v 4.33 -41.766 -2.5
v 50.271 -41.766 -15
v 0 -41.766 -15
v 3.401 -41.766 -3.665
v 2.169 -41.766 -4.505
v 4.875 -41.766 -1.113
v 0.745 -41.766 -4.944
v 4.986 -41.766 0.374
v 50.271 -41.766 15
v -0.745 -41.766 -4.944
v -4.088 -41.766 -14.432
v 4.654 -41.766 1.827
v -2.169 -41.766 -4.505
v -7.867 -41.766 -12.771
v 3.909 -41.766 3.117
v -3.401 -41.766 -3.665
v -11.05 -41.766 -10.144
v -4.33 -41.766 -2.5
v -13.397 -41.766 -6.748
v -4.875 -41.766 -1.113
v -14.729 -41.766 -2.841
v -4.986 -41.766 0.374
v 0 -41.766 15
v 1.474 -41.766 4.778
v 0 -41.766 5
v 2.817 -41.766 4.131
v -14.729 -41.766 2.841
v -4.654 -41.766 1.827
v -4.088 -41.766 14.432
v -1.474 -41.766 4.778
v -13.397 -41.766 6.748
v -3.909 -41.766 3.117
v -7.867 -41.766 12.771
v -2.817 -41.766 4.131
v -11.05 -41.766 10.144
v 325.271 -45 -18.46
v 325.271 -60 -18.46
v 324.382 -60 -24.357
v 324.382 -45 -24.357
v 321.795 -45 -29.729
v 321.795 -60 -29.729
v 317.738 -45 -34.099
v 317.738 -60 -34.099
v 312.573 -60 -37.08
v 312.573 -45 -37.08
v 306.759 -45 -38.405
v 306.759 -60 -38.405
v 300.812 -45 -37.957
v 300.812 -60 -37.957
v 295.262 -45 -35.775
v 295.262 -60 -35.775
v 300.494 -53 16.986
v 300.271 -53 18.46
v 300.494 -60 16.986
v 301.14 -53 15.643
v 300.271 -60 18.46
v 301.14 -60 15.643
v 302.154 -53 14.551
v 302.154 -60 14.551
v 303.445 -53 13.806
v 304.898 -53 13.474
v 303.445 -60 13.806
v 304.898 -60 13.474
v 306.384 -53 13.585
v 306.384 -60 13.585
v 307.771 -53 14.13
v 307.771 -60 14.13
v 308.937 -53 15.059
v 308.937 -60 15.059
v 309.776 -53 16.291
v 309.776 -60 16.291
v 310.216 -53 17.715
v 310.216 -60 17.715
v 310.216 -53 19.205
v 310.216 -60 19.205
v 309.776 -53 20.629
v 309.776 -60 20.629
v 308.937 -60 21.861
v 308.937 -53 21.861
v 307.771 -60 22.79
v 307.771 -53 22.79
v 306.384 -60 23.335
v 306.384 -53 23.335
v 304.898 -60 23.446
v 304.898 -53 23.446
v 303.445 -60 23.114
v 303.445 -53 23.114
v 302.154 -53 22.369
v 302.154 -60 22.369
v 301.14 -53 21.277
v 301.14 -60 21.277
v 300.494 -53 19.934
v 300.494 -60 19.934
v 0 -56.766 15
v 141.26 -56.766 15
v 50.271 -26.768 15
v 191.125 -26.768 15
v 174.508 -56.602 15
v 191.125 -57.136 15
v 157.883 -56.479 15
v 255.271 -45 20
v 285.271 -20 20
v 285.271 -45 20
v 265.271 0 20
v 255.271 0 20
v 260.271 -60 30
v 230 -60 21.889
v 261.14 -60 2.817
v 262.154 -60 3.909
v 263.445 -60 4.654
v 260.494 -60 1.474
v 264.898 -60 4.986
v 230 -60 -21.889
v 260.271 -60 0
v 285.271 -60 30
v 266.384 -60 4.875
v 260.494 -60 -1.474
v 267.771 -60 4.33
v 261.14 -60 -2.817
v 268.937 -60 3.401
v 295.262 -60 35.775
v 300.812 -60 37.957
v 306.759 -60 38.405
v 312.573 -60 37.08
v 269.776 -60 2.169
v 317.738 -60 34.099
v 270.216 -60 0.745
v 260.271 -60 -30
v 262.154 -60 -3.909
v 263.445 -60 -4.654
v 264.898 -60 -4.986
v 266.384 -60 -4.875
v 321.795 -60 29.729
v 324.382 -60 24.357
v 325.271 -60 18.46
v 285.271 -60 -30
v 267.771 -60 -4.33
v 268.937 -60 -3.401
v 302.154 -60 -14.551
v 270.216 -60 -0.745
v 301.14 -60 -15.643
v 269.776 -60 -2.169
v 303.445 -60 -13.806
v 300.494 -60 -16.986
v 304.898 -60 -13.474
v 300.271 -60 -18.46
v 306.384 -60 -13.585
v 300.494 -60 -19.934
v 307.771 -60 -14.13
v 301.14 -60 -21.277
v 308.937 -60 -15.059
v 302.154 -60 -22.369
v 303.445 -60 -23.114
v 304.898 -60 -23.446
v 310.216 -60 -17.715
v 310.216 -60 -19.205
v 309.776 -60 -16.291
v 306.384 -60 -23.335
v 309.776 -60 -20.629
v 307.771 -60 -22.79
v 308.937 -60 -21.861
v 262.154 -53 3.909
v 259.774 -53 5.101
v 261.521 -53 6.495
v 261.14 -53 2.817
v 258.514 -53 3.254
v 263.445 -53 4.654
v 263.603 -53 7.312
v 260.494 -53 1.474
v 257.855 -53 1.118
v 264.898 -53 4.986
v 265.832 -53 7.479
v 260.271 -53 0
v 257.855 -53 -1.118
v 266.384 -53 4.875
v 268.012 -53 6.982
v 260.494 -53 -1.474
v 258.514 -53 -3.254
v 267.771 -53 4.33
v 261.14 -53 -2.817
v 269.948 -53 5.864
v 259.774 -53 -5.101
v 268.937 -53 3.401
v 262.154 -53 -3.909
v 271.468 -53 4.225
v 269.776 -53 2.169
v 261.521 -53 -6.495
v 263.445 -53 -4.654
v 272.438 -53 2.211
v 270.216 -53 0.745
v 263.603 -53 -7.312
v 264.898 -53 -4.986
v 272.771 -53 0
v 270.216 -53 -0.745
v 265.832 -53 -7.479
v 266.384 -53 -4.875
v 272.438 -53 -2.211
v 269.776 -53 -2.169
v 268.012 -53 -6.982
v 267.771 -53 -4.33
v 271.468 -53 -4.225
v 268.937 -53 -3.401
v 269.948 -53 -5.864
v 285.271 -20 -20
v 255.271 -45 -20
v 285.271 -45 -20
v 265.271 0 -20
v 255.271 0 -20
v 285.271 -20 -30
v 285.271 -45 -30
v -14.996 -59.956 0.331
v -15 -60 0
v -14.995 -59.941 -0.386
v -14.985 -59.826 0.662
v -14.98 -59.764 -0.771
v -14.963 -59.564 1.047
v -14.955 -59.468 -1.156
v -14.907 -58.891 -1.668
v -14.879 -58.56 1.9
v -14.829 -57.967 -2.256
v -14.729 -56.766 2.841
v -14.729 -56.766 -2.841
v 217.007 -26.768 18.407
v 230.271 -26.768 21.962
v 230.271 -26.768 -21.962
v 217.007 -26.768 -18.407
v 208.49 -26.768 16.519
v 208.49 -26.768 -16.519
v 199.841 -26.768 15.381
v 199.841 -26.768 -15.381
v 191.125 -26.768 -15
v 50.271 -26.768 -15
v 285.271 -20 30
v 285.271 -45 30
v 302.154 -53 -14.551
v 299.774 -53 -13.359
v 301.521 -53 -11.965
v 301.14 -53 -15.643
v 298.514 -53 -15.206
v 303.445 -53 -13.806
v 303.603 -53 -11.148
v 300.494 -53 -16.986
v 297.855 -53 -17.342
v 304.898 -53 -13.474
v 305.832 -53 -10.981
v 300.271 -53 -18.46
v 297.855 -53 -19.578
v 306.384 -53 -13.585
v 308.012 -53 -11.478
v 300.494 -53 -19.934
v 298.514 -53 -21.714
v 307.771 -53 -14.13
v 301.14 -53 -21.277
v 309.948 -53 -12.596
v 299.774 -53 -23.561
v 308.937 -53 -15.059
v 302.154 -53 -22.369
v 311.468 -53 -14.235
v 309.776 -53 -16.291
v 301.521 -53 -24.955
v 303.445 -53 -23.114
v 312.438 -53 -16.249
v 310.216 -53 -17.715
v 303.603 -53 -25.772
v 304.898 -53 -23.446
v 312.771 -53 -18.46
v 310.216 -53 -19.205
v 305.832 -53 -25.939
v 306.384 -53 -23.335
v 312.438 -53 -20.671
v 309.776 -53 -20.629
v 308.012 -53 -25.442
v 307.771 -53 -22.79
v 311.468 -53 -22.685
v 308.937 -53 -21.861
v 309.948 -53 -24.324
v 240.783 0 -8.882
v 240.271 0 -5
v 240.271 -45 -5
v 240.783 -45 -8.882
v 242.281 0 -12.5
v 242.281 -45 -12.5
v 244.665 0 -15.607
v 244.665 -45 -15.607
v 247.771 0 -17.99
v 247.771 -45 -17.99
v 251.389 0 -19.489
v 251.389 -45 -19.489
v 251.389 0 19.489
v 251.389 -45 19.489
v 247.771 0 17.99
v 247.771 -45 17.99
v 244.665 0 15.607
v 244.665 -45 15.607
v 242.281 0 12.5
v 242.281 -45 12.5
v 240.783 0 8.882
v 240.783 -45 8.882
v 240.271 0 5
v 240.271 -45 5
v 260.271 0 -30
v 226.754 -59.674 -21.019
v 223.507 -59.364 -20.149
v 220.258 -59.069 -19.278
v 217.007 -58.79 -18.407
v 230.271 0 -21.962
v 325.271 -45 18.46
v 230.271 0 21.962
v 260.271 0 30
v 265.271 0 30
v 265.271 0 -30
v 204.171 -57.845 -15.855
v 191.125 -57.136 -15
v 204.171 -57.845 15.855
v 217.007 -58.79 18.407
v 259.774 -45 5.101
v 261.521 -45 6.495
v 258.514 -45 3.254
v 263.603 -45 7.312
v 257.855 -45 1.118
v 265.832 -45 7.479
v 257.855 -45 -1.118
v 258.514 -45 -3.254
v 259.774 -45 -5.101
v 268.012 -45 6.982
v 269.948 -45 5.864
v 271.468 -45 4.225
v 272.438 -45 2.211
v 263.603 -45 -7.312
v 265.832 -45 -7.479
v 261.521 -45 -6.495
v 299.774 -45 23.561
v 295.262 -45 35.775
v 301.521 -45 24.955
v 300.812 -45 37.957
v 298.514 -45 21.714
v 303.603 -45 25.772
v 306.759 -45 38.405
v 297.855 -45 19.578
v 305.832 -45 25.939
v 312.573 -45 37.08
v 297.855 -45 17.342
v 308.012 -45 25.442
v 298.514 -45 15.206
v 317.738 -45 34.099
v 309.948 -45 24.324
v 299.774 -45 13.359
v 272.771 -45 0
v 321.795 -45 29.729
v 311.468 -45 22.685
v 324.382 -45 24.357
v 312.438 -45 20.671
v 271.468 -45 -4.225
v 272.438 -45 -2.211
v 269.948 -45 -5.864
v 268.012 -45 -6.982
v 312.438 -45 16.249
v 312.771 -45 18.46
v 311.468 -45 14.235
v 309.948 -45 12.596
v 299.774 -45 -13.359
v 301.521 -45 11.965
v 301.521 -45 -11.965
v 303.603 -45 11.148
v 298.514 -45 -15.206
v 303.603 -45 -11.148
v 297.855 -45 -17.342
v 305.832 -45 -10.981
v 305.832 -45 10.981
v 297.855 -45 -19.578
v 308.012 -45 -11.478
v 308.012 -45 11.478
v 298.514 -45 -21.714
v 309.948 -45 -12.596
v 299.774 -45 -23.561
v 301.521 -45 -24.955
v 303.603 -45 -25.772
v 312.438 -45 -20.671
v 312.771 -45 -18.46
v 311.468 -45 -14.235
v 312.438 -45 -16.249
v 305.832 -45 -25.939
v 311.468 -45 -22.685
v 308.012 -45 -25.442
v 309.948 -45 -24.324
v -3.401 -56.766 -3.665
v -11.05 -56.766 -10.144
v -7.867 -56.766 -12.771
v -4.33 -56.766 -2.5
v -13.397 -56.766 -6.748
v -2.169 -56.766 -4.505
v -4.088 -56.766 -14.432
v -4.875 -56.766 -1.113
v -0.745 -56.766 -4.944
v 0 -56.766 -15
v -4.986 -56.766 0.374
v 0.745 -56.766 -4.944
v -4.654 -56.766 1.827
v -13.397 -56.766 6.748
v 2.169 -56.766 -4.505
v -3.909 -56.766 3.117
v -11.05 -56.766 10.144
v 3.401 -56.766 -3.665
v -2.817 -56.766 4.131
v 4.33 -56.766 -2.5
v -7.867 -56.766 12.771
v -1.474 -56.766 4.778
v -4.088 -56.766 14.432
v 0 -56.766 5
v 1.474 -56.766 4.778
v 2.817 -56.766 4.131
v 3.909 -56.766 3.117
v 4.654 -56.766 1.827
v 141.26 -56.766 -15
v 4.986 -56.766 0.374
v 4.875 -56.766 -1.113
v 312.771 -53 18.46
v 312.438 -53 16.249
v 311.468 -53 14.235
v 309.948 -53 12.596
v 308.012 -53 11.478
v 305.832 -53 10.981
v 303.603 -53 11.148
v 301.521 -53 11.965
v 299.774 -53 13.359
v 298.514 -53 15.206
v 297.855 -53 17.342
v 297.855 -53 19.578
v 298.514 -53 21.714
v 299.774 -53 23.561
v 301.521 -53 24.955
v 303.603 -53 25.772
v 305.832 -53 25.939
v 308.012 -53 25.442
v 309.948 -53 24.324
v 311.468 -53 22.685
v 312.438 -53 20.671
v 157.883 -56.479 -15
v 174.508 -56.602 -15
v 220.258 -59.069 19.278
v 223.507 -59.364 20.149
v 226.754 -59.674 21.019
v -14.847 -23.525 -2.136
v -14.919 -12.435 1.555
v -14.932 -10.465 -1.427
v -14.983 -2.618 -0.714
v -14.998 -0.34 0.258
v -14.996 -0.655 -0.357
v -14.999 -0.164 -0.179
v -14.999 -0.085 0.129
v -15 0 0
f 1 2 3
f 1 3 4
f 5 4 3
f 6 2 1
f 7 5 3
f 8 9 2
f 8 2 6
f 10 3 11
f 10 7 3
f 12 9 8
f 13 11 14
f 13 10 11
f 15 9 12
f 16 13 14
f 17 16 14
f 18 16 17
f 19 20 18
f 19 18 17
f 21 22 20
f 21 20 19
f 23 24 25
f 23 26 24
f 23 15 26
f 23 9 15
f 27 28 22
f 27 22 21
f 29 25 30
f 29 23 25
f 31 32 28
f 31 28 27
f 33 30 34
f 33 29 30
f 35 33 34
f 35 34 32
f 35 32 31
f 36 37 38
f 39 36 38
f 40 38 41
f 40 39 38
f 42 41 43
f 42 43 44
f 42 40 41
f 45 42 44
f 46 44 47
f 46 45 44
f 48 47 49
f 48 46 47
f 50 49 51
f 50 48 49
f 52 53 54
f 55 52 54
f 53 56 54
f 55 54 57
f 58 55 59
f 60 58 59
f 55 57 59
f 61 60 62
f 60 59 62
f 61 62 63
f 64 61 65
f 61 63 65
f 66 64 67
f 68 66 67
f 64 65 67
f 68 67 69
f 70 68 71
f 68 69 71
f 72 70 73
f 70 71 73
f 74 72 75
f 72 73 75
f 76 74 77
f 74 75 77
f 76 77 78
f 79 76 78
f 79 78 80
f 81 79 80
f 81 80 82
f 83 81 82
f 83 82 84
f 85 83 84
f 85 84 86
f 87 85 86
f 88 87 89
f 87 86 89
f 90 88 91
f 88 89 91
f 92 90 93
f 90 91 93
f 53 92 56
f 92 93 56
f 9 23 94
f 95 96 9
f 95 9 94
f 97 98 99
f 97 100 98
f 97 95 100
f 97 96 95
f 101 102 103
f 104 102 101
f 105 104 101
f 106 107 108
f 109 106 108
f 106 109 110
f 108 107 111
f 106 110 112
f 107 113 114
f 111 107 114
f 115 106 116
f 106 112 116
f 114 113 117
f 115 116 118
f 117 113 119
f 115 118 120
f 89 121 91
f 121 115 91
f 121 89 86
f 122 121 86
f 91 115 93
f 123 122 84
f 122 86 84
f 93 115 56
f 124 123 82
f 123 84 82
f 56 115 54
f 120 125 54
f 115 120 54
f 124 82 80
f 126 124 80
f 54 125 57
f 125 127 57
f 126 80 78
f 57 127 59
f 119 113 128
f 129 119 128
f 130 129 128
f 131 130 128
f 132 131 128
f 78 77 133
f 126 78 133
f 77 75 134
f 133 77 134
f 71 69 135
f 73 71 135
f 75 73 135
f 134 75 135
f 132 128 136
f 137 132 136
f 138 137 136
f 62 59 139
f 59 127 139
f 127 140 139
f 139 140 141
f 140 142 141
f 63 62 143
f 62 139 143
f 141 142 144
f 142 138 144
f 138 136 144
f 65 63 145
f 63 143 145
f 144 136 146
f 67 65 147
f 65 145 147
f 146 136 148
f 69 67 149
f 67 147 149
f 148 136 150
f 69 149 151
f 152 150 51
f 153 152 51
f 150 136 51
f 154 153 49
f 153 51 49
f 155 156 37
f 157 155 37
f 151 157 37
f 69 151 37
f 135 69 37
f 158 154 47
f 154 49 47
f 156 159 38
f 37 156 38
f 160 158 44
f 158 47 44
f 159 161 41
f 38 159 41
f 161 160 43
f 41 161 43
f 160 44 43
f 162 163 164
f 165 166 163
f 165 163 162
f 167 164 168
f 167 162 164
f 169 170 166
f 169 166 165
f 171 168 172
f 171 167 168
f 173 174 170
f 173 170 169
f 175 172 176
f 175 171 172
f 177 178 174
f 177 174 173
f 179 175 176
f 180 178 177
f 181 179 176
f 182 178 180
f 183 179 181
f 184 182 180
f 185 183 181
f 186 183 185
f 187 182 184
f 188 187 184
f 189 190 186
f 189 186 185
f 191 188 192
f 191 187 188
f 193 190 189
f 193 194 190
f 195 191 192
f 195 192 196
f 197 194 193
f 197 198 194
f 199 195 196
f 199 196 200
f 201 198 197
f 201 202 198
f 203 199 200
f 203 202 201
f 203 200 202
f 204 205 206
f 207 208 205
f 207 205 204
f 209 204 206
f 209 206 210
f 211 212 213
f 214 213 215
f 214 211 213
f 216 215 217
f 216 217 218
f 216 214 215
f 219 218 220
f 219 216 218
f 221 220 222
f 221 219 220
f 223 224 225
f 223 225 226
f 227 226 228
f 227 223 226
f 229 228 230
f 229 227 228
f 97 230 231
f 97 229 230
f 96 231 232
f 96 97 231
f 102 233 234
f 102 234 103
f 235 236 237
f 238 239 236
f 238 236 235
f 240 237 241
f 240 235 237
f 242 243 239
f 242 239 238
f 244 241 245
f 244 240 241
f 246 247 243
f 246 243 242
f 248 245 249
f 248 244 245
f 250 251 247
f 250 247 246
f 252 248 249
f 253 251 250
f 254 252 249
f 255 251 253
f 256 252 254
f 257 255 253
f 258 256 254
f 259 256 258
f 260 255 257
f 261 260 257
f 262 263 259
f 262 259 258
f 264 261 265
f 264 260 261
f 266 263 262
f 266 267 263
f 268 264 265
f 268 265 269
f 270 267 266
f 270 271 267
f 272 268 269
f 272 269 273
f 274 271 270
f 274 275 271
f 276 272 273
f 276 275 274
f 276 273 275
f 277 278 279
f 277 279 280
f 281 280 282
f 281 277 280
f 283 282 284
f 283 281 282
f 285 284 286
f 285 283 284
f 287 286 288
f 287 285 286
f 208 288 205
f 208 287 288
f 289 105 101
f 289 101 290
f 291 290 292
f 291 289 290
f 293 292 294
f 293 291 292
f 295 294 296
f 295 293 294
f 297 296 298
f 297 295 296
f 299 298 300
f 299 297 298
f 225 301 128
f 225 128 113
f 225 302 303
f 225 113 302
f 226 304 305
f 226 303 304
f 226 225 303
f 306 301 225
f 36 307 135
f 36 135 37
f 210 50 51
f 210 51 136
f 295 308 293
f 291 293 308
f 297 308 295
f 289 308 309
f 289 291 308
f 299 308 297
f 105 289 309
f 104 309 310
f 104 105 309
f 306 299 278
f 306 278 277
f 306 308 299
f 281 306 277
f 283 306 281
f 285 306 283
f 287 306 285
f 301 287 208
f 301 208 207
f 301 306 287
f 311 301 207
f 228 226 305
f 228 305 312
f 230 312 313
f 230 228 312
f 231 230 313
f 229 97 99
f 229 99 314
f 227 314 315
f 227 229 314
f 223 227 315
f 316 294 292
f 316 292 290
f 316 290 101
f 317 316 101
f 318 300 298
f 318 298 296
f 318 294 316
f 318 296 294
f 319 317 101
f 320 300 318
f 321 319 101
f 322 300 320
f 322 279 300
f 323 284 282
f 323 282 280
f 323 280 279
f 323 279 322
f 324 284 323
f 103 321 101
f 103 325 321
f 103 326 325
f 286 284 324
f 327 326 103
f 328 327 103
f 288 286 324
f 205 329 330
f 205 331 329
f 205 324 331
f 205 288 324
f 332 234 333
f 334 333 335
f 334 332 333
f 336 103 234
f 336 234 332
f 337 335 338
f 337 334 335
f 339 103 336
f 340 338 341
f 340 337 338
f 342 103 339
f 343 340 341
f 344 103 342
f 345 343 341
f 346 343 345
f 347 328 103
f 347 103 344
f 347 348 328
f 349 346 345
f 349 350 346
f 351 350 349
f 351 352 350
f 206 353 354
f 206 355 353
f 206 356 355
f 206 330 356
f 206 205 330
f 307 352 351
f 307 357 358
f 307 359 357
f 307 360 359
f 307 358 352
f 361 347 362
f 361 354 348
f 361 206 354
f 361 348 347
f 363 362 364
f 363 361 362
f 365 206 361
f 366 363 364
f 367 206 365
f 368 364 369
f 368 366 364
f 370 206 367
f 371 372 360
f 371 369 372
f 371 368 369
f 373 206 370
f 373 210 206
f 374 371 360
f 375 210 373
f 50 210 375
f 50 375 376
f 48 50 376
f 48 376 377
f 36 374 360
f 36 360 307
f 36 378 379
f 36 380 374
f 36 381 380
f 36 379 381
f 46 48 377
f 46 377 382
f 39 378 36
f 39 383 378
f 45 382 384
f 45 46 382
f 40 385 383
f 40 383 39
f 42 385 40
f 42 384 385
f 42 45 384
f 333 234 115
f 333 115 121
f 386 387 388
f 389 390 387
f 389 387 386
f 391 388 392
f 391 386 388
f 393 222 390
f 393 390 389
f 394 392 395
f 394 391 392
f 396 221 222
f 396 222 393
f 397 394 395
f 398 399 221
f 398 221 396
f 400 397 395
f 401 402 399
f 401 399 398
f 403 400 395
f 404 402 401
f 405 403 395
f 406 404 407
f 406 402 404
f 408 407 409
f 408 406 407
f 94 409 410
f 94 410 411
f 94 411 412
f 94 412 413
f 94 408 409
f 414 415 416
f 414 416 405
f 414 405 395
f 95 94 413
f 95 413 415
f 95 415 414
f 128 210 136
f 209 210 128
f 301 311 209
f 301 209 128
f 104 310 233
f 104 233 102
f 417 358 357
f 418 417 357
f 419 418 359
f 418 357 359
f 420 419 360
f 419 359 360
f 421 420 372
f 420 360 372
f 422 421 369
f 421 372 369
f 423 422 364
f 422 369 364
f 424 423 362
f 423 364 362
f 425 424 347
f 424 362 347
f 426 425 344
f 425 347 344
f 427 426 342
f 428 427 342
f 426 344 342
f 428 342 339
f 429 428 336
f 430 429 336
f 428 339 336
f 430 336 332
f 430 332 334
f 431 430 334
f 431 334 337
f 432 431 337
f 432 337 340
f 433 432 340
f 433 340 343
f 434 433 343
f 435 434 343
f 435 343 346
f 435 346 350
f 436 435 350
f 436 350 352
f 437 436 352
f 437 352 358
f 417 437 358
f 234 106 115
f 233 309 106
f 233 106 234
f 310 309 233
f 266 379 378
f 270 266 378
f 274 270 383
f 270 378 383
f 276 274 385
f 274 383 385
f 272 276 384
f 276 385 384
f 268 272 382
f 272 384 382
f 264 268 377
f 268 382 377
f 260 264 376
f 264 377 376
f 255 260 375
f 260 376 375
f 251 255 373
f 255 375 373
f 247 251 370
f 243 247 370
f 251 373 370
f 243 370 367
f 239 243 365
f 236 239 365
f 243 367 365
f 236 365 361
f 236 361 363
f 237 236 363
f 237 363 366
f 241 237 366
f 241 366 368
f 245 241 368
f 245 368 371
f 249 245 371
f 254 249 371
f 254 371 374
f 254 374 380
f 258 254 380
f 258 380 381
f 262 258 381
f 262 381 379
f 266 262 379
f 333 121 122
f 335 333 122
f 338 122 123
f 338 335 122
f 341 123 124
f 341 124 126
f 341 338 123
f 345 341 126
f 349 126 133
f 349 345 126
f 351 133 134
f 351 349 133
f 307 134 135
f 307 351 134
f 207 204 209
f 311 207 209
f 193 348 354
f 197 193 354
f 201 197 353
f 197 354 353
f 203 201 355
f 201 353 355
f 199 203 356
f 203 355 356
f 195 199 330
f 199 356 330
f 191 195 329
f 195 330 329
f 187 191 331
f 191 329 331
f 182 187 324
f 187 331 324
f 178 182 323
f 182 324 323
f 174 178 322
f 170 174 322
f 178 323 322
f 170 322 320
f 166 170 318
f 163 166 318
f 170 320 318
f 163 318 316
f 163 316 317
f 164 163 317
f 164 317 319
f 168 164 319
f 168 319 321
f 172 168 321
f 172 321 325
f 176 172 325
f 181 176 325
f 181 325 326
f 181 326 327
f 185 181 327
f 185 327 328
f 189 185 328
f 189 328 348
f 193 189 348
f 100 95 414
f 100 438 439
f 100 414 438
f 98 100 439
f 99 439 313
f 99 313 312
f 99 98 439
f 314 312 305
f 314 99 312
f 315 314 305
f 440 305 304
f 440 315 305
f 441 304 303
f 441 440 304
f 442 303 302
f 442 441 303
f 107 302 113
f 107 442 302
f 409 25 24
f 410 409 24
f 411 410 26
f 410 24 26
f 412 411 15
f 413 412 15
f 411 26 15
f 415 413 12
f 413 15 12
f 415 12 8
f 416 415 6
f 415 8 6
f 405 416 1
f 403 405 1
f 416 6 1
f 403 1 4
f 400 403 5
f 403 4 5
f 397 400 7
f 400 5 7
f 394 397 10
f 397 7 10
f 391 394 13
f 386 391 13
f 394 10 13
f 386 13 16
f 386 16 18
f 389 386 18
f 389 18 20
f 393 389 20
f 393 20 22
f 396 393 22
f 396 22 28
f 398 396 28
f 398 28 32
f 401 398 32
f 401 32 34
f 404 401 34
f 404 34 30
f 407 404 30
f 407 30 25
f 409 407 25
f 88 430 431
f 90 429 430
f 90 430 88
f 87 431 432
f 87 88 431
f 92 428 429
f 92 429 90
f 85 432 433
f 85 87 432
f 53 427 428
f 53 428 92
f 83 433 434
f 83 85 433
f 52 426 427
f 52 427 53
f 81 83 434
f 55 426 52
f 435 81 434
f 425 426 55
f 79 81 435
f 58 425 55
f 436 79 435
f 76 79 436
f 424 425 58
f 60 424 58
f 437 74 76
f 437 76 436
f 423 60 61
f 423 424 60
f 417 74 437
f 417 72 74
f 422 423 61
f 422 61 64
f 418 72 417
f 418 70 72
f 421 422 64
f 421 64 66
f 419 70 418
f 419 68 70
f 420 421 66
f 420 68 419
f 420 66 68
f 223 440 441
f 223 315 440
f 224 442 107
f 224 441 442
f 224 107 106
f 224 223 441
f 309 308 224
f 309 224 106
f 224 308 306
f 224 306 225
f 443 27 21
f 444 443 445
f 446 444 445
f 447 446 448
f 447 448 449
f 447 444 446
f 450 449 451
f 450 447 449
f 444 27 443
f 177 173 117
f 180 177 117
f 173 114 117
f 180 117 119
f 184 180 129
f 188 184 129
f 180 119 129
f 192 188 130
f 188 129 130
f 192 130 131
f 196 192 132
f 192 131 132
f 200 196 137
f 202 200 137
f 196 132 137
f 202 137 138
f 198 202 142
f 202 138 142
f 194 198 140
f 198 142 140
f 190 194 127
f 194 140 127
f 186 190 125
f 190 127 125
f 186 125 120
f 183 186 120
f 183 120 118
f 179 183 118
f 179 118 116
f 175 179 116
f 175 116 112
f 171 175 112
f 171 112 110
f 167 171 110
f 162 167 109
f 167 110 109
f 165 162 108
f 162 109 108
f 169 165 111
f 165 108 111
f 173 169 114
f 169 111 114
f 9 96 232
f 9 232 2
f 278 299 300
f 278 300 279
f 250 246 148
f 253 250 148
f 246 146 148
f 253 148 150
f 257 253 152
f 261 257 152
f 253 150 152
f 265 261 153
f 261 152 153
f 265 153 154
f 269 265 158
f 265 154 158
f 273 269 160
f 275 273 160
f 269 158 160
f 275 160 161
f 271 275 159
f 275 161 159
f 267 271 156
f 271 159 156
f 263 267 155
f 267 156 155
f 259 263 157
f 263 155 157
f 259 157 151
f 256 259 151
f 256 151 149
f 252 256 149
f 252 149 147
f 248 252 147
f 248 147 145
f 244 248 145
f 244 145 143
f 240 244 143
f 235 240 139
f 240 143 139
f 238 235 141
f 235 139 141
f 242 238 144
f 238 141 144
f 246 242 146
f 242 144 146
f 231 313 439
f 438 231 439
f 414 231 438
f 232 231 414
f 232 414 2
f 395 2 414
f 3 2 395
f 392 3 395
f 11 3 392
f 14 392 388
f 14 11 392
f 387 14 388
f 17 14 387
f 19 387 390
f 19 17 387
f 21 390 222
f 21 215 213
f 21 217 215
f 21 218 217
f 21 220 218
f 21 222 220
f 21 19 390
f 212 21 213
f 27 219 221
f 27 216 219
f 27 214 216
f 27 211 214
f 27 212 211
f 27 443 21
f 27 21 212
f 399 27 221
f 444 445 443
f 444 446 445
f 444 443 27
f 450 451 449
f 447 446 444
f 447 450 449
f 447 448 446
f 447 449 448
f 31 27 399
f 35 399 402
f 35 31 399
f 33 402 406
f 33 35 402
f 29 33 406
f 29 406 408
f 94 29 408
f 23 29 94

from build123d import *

# Parameters (mm, degrees)
SKETCH1_R                               = 5
BOSS_EXTRUDE1_DEPTH                     = 60
BOSS_EXTRUDE2_START                     = 15
BOSS_EXTRUDE2_DEPTH                     = 15
CBORE_FOR_M5_HEX_HEAD_BOLT1_D           = 10
CBORE_FOR_M5_HEX_HEAD_BOLT1_CBORE_D     = 15
CBORE_FOR_M5_HEX_HEAD_BOLT1_CBORE_DEPTH = 8
CHAMFER1_SIZE                           = 20
CUT_EXTRUDE3_DEPTH                      = 338.769583605


with BuildPart() as part:
    # Sketch1 → Boss-Extrude1 (new body)
    with BuildSketch(Plane(origin=(0, 0, 0), x_dir=(1, 0, 0), z_dir=(0, 1, 0))):
        with BuildLine():
            ThreePointArc((0, 15), (-15, 0), (0, -15))
            Line((0, -15), (179, -15))
            Line((179, -15), (191.125444005, -15))
            ThreePointArc((191.125444005, -15), (204.178063227, -15.855513863), (217.007348515, -18.407417371))
            Line((217.007348515, -18.407417371), (260.271455877, -30))
            Line((260.271455877, -30), (285.271455877, -30))
            Line((285.271455877, -30), (285.271455877, -20))
            Line((285.271455877, -20), (255.271455877, -20))
            ThreePointArc((255.271455877, -20), (244.66485416, -15.606601718), (240.271455877, -5))
            Line((240.271455877, -5), (240.271455877, 5))
            ThreePointArc((240.271455877, 5), (244.66485416, 15.606601718), (255.271455877, 20))
            Line((255.271455877, 20), (285.271455877, 20))
            Line((285.271455877, 20), (285.271455877, 30))
            Line((285.271455877, 30), (260.271455877, 30))
            Line((260.271455877, 30), (217.007348515, 18.407417371))
            ThreePointArc((217.007348515, 18.407417371), (204.178063227, 15.855513863), (191.125444005, 15))
            Line((191.125444005, 15), (0, 15))
        make_face()
        with Locations(Location((0, 0, 0), (0, 0, 270))):
            Circle(SKETCH1_R, mode=Mode.SUBTRACT)
    extrude(amount=-BOSS_EXTRUDE1_DEPTH)

    # Sketch4 → Boss-Extrude2 (add)
    with BuildSketch(Plane(origin=(0, -60, 0), x_dir=(1, 0, 0), z_dir=(0, 1, 0)).offset(BOSS_EXTRUDE2_START)):
        with BuildLine():
            Line((260.271455877, -20), (260.271455877, 20))
            Line((260.271455877, 20), (255.271455877, 20))
            ThreePointArc((255.271455877, 20), (244.66485416, 15.606601718), (240.271455877, 5))
            Line((240.271455877, 5), (240.271455877, -5))
            ThreePointArc((240.271455877, -5), (244.66485416, -15.606601718), (255.271455877, -20))
            Line((255.271455877, -20), (260.271455877, -20))
        make_face()
        with BuildLine():
            Line((325.271455877, -18.46), (325.271455877, 18.46))
            ThreePointArc((325.271455877, 18.46), (315.266904712, 35.783134895), (295.262355618, 35.77525085))
            Line((295.262355618, 35.77525085), (285.271455877, 30))
            Line((285.271455877, 30), (285.271455877, 20))
            Line((285.271455877, 20), (260.271455877, 20))
            Line((260.271455877, 20), (260.271455877, -20))
            Line((260.271455877, -20), (285.271455877, -20))
            Line((285.271455877, -20), (285.271455877, -30))
            Line((285.271455877, -30), (295.262355618, -35.77525085))
            ThreePointArc((295.262355618, -35.77525085), (315.266904712, -35.783134895), (325.271455877, -18.46))
        make_face()
    extrude(amount=-BOSS_EXTRUDE2_DEPTH)

    # CBORE for M5 Hex Head Bolt1 (through all)
    with Locations(Plane(origin=(0, -45, 0), x_dir=(1, 0, 0), z_dir=(0, 1, 0))):
        with Locations((265.271455877, 0), (305.271455877, 18.46), (305.271455877, -18.46)):
            CounterBoreHole(CBORE_FOR_M5_HEX_HEAD_BOLT1_D / 2, CBORE_FOR_M5_HEX_HEAD_BOLT1_CBORE_D / 2, CBORE_FOR_M5_HEX_HEAD_BOLT1_CBORE_DEPTH)

    # Chamfer1
    chamfer1_edges = [part.edges().sort_by_distance(p)[0] for p in [
        (285.271455877, 0, -25),
        (285.271455877, 0, 25),
    ]]
    chamfer(chamfer1_edges, length=CHAMFER1_SIZE)

    # Sketch9 → Cut-Extrude3 (cut, through all)
    with BuildSketch(Plane.XY.offset(30)):
        Polygon((-15, 0), (230.271455877, 0), (230.271455877, -26.768114978), (50.271455877, -26.768114978), (50.271455877, -41.766455786), (-14.728544123, -41.766455786), align=None)
        with BuildLine():
            ThreePointArc((141.259972199, -56.766455786), (185.683449524, -56.91600014), (230, -60))
            Line((230, -60), (-15, -60))
            Line((-15, -60), (-14.728544123, -56.766455786))
            Line((-14.728544123, -56.766455786), (141.259972199, -56.766455786))
        make_face()
    extrude(amount=-CUT_EXTRUDE3_DEPTH, mode=Mode.SUBTRACT)


solid = part.part
